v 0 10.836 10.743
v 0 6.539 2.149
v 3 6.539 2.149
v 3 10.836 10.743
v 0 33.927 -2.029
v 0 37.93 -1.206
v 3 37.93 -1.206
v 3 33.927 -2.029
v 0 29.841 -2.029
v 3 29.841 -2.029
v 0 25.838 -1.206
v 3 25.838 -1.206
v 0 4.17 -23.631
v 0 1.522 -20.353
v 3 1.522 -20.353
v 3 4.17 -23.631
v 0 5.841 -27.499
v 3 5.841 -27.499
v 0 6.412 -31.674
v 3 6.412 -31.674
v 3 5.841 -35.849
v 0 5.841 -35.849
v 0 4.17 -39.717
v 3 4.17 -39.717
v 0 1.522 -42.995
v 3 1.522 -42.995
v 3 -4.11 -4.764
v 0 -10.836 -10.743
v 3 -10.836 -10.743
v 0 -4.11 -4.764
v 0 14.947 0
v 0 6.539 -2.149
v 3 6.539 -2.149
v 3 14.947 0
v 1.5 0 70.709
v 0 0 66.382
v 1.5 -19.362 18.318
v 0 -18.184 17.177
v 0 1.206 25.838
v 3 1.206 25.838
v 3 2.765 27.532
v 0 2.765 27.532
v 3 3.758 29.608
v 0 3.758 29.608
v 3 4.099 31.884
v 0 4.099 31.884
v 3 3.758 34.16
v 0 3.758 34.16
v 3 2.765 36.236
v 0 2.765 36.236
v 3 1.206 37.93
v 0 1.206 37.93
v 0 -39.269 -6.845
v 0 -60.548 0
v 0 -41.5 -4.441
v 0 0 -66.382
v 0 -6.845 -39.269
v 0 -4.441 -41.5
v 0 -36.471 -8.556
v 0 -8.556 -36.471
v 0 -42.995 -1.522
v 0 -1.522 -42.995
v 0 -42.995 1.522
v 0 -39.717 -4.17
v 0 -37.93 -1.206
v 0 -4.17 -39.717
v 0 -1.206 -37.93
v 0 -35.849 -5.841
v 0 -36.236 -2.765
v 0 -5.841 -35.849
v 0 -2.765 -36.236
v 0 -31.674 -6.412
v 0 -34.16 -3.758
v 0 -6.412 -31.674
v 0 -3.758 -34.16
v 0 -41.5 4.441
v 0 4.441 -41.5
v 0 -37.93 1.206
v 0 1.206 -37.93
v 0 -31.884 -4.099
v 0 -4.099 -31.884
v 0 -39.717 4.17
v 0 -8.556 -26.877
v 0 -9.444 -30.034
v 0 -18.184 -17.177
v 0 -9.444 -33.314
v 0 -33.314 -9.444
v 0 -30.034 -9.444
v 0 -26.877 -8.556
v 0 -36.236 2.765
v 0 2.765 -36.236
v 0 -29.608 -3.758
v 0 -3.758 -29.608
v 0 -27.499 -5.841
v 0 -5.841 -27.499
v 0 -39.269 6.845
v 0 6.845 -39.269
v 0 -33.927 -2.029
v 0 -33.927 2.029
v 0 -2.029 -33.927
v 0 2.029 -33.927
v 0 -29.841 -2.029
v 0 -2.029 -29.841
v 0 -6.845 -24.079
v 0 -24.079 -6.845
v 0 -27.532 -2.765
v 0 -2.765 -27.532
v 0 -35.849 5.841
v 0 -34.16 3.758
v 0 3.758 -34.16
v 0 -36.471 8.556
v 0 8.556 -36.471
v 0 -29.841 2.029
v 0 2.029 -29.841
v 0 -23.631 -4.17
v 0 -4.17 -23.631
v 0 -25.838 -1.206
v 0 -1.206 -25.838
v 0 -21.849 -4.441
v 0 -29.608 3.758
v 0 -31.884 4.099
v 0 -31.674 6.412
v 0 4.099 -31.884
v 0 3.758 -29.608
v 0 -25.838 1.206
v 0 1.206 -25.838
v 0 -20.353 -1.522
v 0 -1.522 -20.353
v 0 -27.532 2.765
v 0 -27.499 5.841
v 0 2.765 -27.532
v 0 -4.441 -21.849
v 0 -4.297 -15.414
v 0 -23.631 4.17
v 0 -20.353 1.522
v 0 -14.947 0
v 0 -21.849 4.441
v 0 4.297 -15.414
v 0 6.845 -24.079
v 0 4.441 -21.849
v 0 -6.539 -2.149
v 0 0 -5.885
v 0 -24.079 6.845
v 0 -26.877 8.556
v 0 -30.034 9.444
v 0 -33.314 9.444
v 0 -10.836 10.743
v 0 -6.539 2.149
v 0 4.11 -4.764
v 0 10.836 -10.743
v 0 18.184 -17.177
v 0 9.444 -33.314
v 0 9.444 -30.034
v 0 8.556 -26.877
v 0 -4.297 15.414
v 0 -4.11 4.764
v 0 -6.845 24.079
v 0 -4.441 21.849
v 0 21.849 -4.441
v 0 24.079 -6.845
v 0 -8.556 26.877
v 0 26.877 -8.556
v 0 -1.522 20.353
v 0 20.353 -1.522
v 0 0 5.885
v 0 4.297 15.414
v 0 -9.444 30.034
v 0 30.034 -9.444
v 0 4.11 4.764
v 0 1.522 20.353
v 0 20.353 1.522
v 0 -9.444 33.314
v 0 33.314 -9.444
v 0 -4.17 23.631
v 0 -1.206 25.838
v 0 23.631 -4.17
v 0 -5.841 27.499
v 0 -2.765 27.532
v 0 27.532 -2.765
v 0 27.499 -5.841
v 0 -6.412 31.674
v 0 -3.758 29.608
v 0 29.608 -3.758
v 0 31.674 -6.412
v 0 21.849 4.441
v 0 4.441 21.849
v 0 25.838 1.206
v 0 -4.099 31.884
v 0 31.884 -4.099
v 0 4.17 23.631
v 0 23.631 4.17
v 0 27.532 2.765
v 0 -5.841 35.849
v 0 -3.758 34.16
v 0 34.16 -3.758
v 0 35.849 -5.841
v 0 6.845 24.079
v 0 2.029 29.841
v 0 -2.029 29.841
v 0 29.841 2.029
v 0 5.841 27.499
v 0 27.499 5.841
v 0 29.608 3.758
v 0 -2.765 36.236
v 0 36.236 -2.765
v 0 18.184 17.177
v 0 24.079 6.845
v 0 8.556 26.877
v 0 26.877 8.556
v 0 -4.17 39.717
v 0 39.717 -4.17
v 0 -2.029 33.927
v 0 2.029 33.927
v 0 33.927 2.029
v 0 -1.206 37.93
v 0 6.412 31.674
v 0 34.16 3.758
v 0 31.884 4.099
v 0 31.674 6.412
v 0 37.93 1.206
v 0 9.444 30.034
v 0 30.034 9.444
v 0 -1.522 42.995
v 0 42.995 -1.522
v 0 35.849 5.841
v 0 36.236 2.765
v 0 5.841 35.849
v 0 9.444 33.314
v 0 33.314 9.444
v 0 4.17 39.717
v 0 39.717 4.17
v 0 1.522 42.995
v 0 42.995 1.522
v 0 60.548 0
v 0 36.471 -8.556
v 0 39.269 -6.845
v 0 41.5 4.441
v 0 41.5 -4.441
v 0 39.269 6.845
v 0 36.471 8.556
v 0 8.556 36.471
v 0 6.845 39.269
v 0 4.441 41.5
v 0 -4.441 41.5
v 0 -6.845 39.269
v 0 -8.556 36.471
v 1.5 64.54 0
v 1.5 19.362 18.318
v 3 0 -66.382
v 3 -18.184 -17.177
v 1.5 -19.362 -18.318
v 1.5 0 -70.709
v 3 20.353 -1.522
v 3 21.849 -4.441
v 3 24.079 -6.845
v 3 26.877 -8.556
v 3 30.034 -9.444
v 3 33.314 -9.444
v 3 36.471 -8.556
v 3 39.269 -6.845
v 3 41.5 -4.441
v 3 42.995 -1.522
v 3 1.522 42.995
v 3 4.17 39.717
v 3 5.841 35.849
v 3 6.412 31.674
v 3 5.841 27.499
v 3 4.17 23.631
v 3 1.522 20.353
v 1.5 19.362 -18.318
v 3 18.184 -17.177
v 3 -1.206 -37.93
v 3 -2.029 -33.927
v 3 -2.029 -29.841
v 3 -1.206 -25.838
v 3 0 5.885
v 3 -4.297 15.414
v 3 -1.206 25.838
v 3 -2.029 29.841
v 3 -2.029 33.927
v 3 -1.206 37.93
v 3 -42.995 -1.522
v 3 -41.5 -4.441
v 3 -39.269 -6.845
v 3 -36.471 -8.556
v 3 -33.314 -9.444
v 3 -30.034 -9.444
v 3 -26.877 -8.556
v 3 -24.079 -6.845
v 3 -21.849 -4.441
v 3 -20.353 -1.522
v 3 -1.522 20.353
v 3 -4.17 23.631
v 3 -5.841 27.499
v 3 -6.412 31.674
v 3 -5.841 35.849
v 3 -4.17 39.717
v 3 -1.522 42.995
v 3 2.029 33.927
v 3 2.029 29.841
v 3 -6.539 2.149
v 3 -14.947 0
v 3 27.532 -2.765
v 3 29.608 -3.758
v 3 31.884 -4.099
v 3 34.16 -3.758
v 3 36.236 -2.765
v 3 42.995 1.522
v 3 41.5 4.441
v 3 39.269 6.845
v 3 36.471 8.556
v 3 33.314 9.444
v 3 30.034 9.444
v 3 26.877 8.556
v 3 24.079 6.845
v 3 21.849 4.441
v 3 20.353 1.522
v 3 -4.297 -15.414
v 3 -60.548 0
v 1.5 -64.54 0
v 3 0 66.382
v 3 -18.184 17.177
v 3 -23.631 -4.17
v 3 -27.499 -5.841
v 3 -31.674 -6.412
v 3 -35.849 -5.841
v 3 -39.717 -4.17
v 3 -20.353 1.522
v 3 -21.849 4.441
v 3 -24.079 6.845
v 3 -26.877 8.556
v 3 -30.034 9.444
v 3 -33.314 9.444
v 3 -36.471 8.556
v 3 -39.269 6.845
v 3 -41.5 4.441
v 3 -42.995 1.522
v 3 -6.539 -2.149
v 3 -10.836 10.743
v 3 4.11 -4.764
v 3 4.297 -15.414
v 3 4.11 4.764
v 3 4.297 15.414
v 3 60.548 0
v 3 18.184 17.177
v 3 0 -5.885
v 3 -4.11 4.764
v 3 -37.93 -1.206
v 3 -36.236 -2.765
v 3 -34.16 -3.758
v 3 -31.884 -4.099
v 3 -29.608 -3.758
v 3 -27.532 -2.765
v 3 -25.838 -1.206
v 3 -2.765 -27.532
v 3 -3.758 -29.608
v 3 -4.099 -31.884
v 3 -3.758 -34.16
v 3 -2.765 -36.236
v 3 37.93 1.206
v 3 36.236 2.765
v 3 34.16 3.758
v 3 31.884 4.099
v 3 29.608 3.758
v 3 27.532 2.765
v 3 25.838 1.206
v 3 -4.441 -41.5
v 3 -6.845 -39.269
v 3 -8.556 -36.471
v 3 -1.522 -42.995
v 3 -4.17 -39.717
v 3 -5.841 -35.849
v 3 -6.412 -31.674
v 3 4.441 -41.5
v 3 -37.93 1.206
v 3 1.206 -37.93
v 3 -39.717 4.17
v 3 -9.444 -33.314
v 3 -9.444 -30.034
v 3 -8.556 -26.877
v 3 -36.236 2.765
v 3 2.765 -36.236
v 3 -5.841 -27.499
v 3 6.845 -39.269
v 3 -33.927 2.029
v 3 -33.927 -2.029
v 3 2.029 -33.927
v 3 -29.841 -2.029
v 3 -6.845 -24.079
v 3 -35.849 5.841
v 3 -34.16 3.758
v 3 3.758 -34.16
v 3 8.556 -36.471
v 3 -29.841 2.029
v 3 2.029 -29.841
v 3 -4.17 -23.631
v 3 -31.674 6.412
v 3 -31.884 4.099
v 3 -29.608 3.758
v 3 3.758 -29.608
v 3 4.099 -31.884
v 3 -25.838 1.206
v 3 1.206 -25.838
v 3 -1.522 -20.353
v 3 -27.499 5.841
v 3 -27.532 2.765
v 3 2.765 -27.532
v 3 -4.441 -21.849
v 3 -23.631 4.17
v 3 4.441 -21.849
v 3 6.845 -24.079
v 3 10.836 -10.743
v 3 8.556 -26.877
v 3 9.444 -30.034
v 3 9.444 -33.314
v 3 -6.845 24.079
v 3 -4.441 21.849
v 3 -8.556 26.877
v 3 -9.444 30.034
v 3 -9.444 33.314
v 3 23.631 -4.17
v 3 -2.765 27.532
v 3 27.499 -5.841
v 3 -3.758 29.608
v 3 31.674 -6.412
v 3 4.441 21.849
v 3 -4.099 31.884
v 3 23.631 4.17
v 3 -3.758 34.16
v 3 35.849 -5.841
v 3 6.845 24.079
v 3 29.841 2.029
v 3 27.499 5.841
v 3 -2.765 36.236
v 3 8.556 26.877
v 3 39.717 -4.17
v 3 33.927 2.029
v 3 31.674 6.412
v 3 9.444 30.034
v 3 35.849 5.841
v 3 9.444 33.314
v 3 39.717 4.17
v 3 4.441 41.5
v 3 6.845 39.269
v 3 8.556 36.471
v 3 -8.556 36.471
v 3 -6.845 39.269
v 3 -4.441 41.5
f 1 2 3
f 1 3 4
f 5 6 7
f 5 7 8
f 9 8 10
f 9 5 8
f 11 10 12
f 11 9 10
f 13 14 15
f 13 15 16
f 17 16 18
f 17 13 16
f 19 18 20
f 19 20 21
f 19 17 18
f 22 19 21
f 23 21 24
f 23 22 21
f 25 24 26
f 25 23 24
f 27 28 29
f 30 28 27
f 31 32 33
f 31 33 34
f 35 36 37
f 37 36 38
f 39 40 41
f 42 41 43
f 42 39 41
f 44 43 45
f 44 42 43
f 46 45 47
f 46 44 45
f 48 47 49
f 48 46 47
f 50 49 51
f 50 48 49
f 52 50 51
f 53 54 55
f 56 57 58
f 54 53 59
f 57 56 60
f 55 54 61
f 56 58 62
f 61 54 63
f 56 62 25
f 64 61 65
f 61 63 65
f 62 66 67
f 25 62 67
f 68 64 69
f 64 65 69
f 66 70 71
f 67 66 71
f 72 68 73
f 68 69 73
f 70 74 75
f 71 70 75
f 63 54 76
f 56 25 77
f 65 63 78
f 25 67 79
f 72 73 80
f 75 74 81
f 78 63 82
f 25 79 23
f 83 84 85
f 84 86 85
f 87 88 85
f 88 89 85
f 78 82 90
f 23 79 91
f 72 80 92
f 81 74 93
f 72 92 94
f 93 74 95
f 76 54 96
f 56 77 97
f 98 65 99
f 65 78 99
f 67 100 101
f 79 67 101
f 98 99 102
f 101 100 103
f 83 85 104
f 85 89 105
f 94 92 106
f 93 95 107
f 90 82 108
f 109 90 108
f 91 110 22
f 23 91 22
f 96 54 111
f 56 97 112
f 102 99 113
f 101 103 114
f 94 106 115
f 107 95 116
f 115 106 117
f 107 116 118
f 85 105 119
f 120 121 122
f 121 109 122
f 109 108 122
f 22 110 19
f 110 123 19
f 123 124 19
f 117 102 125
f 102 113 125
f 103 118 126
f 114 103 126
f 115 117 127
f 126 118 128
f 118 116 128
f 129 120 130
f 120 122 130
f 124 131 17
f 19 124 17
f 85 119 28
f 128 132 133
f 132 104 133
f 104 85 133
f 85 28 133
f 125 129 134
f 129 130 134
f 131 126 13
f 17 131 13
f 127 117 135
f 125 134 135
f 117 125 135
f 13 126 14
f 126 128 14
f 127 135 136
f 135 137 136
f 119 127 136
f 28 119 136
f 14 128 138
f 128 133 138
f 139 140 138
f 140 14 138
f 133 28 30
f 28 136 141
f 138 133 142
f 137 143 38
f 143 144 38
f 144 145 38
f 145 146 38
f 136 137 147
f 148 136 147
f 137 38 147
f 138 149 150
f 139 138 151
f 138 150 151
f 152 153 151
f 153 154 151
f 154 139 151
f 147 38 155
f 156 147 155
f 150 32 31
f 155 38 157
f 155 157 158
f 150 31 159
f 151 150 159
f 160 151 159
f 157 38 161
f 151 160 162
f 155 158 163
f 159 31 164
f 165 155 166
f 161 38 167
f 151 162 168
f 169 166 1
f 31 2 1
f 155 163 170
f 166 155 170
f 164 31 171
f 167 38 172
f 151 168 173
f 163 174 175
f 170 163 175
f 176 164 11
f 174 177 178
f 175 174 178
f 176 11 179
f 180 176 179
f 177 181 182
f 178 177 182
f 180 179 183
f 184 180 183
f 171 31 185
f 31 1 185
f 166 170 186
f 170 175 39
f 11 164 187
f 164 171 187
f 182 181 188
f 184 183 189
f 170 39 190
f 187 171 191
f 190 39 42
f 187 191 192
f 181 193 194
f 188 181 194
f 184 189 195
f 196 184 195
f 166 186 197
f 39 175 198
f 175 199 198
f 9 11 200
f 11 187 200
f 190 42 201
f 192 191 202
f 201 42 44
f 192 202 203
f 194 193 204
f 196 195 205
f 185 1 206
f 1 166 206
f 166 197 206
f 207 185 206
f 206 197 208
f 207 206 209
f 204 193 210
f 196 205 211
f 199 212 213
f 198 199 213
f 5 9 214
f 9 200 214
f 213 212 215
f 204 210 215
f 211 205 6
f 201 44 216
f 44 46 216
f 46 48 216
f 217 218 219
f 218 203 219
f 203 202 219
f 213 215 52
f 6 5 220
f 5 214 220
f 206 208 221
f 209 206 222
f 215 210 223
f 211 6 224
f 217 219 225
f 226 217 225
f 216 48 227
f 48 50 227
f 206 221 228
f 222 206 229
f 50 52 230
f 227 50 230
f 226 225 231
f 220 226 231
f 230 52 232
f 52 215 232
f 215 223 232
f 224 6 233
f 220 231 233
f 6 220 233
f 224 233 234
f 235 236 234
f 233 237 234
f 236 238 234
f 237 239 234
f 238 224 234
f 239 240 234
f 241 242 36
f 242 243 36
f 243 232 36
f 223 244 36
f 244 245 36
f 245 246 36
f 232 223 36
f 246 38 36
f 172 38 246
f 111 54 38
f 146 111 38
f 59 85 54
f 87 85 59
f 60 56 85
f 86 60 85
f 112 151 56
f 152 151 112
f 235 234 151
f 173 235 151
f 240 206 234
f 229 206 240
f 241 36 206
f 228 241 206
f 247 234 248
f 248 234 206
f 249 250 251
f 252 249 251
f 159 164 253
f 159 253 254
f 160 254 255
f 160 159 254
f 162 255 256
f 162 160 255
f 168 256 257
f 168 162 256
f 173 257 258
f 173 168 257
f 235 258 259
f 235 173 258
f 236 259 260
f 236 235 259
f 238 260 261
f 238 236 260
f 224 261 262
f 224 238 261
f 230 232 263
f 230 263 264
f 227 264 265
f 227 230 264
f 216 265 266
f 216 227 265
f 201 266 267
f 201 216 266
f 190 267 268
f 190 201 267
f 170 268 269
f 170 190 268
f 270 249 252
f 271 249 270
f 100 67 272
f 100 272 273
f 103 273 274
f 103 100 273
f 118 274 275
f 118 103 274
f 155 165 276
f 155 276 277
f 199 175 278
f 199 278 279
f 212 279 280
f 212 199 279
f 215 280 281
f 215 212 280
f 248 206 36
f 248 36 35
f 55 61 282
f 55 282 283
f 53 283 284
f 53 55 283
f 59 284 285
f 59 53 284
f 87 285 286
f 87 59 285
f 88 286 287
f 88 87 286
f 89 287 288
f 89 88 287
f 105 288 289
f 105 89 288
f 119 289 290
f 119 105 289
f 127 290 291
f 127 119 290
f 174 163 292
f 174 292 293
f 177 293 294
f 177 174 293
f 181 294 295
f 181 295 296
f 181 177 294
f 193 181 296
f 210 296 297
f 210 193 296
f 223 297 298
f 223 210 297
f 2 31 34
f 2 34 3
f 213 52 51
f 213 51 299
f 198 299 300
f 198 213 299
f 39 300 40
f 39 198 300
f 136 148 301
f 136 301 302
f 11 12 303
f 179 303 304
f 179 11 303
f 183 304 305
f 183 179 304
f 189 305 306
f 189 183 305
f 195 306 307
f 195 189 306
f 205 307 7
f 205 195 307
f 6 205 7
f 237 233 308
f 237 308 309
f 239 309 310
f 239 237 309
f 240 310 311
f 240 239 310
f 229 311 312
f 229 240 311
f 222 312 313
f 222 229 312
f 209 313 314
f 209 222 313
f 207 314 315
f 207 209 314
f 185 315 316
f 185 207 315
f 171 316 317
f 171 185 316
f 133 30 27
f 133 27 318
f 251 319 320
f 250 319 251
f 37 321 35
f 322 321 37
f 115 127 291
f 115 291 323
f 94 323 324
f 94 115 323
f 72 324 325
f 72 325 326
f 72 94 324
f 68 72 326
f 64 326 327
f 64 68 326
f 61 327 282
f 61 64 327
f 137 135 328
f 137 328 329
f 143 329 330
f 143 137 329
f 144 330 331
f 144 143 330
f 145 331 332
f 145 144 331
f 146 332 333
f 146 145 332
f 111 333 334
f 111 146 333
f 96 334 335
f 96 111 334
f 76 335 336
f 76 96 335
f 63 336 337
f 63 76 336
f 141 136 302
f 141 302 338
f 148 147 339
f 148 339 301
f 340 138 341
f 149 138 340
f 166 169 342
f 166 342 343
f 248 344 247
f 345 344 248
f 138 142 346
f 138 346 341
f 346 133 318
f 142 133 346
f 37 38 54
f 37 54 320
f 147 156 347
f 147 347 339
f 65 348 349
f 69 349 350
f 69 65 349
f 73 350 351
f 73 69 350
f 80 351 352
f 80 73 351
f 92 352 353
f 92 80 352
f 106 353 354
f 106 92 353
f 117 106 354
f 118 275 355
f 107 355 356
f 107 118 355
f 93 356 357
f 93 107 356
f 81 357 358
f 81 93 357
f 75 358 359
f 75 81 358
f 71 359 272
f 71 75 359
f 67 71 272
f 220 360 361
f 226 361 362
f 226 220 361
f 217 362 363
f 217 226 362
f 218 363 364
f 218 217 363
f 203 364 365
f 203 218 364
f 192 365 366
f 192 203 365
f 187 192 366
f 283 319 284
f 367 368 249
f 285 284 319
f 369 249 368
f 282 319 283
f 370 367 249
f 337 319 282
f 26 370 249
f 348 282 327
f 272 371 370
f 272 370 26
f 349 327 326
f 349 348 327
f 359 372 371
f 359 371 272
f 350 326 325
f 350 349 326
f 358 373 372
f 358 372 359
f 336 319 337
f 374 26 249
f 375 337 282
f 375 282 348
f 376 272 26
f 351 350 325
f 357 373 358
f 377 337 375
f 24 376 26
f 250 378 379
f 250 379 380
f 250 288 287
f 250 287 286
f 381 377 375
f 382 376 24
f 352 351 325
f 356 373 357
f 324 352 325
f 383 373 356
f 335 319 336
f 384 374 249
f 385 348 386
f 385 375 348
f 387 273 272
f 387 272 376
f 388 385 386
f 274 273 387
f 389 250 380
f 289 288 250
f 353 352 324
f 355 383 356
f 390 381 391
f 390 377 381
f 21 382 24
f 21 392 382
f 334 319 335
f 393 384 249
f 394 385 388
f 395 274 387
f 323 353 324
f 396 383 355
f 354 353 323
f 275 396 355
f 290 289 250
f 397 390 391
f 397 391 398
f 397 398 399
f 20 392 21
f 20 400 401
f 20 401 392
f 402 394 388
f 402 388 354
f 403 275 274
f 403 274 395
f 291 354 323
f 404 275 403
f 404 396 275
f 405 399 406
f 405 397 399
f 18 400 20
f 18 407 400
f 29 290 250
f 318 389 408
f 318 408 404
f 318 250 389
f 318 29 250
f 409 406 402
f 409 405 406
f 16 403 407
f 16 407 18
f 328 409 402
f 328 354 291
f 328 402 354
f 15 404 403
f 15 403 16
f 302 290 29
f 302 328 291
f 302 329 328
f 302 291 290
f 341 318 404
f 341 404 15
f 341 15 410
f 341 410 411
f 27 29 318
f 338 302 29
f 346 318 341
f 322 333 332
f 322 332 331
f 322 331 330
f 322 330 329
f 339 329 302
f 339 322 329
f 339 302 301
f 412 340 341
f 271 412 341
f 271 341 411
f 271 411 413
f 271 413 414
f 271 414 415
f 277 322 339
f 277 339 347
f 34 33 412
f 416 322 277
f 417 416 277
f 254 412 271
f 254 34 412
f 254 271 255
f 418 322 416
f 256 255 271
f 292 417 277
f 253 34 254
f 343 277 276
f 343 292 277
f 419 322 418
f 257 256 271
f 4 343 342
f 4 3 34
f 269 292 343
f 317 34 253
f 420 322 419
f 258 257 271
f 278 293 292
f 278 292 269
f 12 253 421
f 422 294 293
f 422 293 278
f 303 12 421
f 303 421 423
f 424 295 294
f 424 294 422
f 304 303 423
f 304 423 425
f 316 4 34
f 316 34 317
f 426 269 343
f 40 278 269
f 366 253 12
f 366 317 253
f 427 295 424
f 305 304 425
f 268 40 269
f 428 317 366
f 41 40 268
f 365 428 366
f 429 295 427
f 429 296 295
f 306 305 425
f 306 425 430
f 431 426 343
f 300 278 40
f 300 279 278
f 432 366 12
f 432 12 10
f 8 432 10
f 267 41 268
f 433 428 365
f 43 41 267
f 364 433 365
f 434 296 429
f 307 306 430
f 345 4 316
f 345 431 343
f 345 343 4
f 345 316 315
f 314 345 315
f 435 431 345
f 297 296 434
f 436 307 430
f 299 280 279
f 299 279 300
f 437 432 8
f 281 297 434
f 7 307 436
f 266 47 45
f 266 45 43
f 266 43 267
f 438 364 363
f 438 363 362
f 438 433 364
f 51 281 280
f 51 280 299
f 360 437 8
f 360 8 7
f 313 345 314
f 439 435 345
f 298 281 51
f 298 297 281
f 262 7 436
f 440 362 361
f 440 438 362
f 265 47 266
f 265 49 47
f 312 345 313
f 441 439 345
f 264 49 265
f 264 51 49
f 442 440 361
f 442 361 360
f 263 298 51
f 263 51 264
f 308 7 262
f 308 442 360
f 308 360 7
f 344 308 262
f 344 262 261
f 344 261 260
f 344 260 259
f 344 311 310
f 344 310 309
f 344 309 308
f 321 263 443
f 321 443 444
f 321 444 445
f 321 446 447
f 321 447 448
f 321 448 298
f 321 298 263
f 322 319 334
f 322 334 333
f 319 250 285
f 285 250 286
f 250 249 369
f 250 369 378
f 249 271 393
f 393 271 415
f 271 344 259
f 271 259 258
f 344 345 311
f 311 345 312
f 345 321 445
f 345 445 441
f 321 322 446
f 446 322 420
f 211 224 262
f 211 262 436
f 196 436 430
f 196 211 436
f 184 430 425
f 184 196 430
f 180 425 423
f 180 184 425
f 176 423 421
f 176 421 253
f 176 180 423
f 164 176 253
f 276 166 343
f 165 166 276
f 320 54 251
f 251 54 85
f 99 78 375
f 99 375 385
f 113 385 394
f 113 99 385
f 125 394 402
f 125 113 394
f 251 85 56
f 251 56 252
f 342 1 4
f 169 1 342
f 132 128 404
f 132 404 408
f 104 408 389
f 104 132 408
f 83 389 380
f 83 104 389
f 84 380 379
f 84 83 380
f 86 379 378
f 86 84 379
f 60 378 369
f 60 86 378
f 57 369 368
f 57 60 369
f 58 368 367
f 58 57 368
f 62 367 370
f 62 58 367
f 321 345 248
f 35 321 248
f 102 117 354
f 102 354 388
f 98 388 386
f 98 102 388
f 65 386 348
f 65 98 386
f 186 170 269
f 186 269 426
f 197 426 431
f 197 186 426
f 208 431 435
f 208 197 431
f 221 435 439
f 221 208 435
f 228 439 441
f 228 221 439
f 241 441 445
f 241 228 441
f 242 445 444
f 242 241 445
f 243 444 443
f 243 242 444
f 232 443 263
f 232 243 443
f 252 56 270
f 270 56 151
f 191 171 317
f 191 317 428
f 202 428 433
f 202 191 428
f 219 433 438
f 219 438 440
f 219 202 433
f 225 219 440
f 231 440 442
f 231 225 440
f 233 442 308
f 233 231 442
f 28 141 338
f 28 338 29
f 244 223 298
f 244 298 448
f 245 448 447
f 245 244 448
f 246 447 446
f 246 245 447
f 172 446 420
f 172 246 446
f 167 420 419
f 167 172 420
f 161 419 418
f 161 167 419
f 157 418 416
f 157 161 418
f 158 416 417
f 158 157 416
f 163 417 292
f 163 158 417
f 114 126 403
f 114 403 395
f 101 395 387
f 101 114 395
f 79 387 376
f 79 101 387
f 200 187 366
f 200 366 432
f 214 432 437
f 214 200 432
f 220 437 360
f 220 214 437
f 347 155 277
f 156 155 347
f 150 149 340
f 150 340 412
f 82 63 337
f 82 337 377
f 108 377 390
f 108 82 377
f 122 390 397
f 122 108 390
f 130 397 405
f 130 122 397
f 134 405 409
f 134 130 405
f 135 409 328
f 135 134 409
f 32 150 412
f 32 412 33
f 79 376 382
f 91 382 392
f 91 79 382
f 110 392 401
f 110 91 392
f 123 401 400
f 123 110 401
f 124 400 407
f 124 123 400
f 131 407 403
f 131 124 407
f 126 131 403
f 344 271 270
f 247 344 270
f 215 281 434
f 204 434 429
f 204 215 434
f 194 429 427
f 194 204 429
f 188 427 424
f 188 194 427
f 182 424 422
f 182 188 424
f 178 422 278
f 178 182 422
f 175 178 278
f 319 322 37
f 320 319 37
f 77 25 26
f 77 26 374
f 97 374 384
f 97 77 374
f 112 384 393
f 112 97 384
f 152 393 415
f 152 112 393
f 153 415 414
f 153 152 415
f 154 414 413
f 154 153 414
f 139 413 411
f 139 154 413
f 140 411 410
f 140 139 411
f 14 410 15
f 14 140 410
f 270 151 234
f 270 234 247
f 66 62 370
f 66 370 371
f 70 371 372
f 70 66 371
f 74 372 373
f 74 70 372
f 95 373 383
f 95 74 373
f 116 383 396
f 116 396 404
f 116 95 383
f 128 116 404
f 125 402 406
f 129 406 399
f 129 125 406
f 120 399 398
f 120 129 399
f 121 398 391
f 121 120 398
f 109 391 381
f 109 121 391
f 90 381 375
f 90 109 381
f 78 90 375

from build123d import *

# Parameters (mm, degrees)
F1_DEPTH = 3
F2_SIZE  = 1.49999
F4_DEPTH = 25
F6_DEPTH = 3.001
F8_COUNT = 4


# Not quite as in the source:
# - a fillet or chamfer is up to 0.001 mm smaller than in the source, because OpenCascade refuses the exact size


with BuildPart() as f1:
    # F0 (on Right) → F1 (new body)
    with BuildSketch(Plane.YZ):
        Polygon((-19.3618498743, -18.3178298175), (0, -70.7087218761), (19.3618498743, -18.3178298175), (64.5395070314, 0), (19.3618498743, 18.3178298175), (0, 70.7087218761), (-19.3618498743, 18.3178298175), (-64.5395070314, 0), align=None)
    extrude(amount=F1_DEPTH)

    # F2 (size 1.5 in the source; OpenCascade refuses exactly that, so slightly less here)
    f2_edges = [f1.edges().sort_by_distance(p)[0] for p in [
        (3, -41.950678, 9.158915),
        (3, -9.680925, 44.513276),
        (0, -9.680925, 44.513276),
        (0, -41.950678, 9.158915),
        (0, -41.950678, -9.158915),
        (3, -41.950678, -9.158915),
        (0, -9.680925, -44.513276),
        (3, -9.680925, -44.513276),
        (3, 9.680925, -44.513276),
        (0, 9.680925, -44.513276),
        (3, 41.950678, -9.158915),
        (0, 41.950678, -9.158915),
        (0, 9.680925, 44.513276),
        (3, 9.680925, 44.513276),
        (3, 41.950678, 9.158915),
        (0, 41.950678, 9.158915),
    ]]
    chamfer(f2_edges, length=F2_SIZE)

    # F3 (on Right) → F4 (cut)
    with BuildSketch(Plane.YZ):
        Polygon((-4.2971530929, -15.4137015343), (0, -5.8852313086), (4.2971530929, -15.4137015343), (4.1103190742, -4.7642351128), (10.8362995088, -10.7428822666), (6.5391454846, -2.1485765465), (14.94661998, 0), (6.5391454846, 2.1485765465), (10.8362995088, 10.7428822666), (4.1103190742, 4.7642351128), (4.2971530929, 15.4137015343), (0, 5.8852313086), (-4.2971530929, 15.4137015343), (-4.1103190742, 4.7642351128), (-10.8362995088, 10.7428822666), (-6.5391454846, 2.1485765465), (-14.94661998, 0), (-6.5391454846, -2.1485765465), (-10.8362995088, -10.7428822666), (-4.1103190742, -4.7642351128), align=None)
    extrude(amount=F4_DEPTH, mode=Mode.SUBTRACT)

    # F5 (on Right) → F6 (cut, through all)
    with BuildSketch(Plane.YZ):
        with BuildLine():
            ThreePointArc((-1.5215650201, -20.3531272709), (-9.5569240867, -31.6740609705), (-1.5215650201, -42.9949946702))
            ThreePointArc((-1.5215650201, -42.9949946702), (-6.4116749119, -31.6740609705), (-1.5215650201, -20.3531272709))
        make_face()
        with BuildLine():
            ThreePointArc((-1.2058431748, -25.8382316679), (-4.0993778142, -31.8839969113), (-1.2058431748, -37.9297621548))
            ThreePointArc((-1.2058431748, -37.9297621548), (-2.1323484034, -31.8839969113), (-1.2058431748, -25.8382316679))
        make_face()
        with BuildLine():
            ThreePointArc((1.5215650201, -20.3531272709), (6.4116749119, -31.6740609705), (1.5215650201, -42.9949946702))
            ThreePointArc((1.5215650201, -42.9949946702), (9.5569240867, -31.6740609705), (1.5215650201, -20.3531272709))
        make_face()
        with BuildLine():
            ThreePointArc((1.2058431748, -25.8382316679), (2.1323484034, -31.8839969113), (1.2058431748, -37.9297621548))
            ThreePointArc((1.2058431748, -37.9297621548), (4.0993778142, -31.8839969113), (1.2058431748, -25.8382316679))
        make_face()
    f6 = extrude(amount=F6_DEPTH, mode=Mode.SUBTRACT)

    # F8: F6 ×4 about axis
    f8_axis = Axis((-24.6906243265, 0, 0), (-1, 0, 0))
    for i in range(1, F8_COUNT):
        add(f6.rotate(f8_axis, i * 360 / F8_COUNT), mode=Mode.SUBTRACT)


solid = f1.part
